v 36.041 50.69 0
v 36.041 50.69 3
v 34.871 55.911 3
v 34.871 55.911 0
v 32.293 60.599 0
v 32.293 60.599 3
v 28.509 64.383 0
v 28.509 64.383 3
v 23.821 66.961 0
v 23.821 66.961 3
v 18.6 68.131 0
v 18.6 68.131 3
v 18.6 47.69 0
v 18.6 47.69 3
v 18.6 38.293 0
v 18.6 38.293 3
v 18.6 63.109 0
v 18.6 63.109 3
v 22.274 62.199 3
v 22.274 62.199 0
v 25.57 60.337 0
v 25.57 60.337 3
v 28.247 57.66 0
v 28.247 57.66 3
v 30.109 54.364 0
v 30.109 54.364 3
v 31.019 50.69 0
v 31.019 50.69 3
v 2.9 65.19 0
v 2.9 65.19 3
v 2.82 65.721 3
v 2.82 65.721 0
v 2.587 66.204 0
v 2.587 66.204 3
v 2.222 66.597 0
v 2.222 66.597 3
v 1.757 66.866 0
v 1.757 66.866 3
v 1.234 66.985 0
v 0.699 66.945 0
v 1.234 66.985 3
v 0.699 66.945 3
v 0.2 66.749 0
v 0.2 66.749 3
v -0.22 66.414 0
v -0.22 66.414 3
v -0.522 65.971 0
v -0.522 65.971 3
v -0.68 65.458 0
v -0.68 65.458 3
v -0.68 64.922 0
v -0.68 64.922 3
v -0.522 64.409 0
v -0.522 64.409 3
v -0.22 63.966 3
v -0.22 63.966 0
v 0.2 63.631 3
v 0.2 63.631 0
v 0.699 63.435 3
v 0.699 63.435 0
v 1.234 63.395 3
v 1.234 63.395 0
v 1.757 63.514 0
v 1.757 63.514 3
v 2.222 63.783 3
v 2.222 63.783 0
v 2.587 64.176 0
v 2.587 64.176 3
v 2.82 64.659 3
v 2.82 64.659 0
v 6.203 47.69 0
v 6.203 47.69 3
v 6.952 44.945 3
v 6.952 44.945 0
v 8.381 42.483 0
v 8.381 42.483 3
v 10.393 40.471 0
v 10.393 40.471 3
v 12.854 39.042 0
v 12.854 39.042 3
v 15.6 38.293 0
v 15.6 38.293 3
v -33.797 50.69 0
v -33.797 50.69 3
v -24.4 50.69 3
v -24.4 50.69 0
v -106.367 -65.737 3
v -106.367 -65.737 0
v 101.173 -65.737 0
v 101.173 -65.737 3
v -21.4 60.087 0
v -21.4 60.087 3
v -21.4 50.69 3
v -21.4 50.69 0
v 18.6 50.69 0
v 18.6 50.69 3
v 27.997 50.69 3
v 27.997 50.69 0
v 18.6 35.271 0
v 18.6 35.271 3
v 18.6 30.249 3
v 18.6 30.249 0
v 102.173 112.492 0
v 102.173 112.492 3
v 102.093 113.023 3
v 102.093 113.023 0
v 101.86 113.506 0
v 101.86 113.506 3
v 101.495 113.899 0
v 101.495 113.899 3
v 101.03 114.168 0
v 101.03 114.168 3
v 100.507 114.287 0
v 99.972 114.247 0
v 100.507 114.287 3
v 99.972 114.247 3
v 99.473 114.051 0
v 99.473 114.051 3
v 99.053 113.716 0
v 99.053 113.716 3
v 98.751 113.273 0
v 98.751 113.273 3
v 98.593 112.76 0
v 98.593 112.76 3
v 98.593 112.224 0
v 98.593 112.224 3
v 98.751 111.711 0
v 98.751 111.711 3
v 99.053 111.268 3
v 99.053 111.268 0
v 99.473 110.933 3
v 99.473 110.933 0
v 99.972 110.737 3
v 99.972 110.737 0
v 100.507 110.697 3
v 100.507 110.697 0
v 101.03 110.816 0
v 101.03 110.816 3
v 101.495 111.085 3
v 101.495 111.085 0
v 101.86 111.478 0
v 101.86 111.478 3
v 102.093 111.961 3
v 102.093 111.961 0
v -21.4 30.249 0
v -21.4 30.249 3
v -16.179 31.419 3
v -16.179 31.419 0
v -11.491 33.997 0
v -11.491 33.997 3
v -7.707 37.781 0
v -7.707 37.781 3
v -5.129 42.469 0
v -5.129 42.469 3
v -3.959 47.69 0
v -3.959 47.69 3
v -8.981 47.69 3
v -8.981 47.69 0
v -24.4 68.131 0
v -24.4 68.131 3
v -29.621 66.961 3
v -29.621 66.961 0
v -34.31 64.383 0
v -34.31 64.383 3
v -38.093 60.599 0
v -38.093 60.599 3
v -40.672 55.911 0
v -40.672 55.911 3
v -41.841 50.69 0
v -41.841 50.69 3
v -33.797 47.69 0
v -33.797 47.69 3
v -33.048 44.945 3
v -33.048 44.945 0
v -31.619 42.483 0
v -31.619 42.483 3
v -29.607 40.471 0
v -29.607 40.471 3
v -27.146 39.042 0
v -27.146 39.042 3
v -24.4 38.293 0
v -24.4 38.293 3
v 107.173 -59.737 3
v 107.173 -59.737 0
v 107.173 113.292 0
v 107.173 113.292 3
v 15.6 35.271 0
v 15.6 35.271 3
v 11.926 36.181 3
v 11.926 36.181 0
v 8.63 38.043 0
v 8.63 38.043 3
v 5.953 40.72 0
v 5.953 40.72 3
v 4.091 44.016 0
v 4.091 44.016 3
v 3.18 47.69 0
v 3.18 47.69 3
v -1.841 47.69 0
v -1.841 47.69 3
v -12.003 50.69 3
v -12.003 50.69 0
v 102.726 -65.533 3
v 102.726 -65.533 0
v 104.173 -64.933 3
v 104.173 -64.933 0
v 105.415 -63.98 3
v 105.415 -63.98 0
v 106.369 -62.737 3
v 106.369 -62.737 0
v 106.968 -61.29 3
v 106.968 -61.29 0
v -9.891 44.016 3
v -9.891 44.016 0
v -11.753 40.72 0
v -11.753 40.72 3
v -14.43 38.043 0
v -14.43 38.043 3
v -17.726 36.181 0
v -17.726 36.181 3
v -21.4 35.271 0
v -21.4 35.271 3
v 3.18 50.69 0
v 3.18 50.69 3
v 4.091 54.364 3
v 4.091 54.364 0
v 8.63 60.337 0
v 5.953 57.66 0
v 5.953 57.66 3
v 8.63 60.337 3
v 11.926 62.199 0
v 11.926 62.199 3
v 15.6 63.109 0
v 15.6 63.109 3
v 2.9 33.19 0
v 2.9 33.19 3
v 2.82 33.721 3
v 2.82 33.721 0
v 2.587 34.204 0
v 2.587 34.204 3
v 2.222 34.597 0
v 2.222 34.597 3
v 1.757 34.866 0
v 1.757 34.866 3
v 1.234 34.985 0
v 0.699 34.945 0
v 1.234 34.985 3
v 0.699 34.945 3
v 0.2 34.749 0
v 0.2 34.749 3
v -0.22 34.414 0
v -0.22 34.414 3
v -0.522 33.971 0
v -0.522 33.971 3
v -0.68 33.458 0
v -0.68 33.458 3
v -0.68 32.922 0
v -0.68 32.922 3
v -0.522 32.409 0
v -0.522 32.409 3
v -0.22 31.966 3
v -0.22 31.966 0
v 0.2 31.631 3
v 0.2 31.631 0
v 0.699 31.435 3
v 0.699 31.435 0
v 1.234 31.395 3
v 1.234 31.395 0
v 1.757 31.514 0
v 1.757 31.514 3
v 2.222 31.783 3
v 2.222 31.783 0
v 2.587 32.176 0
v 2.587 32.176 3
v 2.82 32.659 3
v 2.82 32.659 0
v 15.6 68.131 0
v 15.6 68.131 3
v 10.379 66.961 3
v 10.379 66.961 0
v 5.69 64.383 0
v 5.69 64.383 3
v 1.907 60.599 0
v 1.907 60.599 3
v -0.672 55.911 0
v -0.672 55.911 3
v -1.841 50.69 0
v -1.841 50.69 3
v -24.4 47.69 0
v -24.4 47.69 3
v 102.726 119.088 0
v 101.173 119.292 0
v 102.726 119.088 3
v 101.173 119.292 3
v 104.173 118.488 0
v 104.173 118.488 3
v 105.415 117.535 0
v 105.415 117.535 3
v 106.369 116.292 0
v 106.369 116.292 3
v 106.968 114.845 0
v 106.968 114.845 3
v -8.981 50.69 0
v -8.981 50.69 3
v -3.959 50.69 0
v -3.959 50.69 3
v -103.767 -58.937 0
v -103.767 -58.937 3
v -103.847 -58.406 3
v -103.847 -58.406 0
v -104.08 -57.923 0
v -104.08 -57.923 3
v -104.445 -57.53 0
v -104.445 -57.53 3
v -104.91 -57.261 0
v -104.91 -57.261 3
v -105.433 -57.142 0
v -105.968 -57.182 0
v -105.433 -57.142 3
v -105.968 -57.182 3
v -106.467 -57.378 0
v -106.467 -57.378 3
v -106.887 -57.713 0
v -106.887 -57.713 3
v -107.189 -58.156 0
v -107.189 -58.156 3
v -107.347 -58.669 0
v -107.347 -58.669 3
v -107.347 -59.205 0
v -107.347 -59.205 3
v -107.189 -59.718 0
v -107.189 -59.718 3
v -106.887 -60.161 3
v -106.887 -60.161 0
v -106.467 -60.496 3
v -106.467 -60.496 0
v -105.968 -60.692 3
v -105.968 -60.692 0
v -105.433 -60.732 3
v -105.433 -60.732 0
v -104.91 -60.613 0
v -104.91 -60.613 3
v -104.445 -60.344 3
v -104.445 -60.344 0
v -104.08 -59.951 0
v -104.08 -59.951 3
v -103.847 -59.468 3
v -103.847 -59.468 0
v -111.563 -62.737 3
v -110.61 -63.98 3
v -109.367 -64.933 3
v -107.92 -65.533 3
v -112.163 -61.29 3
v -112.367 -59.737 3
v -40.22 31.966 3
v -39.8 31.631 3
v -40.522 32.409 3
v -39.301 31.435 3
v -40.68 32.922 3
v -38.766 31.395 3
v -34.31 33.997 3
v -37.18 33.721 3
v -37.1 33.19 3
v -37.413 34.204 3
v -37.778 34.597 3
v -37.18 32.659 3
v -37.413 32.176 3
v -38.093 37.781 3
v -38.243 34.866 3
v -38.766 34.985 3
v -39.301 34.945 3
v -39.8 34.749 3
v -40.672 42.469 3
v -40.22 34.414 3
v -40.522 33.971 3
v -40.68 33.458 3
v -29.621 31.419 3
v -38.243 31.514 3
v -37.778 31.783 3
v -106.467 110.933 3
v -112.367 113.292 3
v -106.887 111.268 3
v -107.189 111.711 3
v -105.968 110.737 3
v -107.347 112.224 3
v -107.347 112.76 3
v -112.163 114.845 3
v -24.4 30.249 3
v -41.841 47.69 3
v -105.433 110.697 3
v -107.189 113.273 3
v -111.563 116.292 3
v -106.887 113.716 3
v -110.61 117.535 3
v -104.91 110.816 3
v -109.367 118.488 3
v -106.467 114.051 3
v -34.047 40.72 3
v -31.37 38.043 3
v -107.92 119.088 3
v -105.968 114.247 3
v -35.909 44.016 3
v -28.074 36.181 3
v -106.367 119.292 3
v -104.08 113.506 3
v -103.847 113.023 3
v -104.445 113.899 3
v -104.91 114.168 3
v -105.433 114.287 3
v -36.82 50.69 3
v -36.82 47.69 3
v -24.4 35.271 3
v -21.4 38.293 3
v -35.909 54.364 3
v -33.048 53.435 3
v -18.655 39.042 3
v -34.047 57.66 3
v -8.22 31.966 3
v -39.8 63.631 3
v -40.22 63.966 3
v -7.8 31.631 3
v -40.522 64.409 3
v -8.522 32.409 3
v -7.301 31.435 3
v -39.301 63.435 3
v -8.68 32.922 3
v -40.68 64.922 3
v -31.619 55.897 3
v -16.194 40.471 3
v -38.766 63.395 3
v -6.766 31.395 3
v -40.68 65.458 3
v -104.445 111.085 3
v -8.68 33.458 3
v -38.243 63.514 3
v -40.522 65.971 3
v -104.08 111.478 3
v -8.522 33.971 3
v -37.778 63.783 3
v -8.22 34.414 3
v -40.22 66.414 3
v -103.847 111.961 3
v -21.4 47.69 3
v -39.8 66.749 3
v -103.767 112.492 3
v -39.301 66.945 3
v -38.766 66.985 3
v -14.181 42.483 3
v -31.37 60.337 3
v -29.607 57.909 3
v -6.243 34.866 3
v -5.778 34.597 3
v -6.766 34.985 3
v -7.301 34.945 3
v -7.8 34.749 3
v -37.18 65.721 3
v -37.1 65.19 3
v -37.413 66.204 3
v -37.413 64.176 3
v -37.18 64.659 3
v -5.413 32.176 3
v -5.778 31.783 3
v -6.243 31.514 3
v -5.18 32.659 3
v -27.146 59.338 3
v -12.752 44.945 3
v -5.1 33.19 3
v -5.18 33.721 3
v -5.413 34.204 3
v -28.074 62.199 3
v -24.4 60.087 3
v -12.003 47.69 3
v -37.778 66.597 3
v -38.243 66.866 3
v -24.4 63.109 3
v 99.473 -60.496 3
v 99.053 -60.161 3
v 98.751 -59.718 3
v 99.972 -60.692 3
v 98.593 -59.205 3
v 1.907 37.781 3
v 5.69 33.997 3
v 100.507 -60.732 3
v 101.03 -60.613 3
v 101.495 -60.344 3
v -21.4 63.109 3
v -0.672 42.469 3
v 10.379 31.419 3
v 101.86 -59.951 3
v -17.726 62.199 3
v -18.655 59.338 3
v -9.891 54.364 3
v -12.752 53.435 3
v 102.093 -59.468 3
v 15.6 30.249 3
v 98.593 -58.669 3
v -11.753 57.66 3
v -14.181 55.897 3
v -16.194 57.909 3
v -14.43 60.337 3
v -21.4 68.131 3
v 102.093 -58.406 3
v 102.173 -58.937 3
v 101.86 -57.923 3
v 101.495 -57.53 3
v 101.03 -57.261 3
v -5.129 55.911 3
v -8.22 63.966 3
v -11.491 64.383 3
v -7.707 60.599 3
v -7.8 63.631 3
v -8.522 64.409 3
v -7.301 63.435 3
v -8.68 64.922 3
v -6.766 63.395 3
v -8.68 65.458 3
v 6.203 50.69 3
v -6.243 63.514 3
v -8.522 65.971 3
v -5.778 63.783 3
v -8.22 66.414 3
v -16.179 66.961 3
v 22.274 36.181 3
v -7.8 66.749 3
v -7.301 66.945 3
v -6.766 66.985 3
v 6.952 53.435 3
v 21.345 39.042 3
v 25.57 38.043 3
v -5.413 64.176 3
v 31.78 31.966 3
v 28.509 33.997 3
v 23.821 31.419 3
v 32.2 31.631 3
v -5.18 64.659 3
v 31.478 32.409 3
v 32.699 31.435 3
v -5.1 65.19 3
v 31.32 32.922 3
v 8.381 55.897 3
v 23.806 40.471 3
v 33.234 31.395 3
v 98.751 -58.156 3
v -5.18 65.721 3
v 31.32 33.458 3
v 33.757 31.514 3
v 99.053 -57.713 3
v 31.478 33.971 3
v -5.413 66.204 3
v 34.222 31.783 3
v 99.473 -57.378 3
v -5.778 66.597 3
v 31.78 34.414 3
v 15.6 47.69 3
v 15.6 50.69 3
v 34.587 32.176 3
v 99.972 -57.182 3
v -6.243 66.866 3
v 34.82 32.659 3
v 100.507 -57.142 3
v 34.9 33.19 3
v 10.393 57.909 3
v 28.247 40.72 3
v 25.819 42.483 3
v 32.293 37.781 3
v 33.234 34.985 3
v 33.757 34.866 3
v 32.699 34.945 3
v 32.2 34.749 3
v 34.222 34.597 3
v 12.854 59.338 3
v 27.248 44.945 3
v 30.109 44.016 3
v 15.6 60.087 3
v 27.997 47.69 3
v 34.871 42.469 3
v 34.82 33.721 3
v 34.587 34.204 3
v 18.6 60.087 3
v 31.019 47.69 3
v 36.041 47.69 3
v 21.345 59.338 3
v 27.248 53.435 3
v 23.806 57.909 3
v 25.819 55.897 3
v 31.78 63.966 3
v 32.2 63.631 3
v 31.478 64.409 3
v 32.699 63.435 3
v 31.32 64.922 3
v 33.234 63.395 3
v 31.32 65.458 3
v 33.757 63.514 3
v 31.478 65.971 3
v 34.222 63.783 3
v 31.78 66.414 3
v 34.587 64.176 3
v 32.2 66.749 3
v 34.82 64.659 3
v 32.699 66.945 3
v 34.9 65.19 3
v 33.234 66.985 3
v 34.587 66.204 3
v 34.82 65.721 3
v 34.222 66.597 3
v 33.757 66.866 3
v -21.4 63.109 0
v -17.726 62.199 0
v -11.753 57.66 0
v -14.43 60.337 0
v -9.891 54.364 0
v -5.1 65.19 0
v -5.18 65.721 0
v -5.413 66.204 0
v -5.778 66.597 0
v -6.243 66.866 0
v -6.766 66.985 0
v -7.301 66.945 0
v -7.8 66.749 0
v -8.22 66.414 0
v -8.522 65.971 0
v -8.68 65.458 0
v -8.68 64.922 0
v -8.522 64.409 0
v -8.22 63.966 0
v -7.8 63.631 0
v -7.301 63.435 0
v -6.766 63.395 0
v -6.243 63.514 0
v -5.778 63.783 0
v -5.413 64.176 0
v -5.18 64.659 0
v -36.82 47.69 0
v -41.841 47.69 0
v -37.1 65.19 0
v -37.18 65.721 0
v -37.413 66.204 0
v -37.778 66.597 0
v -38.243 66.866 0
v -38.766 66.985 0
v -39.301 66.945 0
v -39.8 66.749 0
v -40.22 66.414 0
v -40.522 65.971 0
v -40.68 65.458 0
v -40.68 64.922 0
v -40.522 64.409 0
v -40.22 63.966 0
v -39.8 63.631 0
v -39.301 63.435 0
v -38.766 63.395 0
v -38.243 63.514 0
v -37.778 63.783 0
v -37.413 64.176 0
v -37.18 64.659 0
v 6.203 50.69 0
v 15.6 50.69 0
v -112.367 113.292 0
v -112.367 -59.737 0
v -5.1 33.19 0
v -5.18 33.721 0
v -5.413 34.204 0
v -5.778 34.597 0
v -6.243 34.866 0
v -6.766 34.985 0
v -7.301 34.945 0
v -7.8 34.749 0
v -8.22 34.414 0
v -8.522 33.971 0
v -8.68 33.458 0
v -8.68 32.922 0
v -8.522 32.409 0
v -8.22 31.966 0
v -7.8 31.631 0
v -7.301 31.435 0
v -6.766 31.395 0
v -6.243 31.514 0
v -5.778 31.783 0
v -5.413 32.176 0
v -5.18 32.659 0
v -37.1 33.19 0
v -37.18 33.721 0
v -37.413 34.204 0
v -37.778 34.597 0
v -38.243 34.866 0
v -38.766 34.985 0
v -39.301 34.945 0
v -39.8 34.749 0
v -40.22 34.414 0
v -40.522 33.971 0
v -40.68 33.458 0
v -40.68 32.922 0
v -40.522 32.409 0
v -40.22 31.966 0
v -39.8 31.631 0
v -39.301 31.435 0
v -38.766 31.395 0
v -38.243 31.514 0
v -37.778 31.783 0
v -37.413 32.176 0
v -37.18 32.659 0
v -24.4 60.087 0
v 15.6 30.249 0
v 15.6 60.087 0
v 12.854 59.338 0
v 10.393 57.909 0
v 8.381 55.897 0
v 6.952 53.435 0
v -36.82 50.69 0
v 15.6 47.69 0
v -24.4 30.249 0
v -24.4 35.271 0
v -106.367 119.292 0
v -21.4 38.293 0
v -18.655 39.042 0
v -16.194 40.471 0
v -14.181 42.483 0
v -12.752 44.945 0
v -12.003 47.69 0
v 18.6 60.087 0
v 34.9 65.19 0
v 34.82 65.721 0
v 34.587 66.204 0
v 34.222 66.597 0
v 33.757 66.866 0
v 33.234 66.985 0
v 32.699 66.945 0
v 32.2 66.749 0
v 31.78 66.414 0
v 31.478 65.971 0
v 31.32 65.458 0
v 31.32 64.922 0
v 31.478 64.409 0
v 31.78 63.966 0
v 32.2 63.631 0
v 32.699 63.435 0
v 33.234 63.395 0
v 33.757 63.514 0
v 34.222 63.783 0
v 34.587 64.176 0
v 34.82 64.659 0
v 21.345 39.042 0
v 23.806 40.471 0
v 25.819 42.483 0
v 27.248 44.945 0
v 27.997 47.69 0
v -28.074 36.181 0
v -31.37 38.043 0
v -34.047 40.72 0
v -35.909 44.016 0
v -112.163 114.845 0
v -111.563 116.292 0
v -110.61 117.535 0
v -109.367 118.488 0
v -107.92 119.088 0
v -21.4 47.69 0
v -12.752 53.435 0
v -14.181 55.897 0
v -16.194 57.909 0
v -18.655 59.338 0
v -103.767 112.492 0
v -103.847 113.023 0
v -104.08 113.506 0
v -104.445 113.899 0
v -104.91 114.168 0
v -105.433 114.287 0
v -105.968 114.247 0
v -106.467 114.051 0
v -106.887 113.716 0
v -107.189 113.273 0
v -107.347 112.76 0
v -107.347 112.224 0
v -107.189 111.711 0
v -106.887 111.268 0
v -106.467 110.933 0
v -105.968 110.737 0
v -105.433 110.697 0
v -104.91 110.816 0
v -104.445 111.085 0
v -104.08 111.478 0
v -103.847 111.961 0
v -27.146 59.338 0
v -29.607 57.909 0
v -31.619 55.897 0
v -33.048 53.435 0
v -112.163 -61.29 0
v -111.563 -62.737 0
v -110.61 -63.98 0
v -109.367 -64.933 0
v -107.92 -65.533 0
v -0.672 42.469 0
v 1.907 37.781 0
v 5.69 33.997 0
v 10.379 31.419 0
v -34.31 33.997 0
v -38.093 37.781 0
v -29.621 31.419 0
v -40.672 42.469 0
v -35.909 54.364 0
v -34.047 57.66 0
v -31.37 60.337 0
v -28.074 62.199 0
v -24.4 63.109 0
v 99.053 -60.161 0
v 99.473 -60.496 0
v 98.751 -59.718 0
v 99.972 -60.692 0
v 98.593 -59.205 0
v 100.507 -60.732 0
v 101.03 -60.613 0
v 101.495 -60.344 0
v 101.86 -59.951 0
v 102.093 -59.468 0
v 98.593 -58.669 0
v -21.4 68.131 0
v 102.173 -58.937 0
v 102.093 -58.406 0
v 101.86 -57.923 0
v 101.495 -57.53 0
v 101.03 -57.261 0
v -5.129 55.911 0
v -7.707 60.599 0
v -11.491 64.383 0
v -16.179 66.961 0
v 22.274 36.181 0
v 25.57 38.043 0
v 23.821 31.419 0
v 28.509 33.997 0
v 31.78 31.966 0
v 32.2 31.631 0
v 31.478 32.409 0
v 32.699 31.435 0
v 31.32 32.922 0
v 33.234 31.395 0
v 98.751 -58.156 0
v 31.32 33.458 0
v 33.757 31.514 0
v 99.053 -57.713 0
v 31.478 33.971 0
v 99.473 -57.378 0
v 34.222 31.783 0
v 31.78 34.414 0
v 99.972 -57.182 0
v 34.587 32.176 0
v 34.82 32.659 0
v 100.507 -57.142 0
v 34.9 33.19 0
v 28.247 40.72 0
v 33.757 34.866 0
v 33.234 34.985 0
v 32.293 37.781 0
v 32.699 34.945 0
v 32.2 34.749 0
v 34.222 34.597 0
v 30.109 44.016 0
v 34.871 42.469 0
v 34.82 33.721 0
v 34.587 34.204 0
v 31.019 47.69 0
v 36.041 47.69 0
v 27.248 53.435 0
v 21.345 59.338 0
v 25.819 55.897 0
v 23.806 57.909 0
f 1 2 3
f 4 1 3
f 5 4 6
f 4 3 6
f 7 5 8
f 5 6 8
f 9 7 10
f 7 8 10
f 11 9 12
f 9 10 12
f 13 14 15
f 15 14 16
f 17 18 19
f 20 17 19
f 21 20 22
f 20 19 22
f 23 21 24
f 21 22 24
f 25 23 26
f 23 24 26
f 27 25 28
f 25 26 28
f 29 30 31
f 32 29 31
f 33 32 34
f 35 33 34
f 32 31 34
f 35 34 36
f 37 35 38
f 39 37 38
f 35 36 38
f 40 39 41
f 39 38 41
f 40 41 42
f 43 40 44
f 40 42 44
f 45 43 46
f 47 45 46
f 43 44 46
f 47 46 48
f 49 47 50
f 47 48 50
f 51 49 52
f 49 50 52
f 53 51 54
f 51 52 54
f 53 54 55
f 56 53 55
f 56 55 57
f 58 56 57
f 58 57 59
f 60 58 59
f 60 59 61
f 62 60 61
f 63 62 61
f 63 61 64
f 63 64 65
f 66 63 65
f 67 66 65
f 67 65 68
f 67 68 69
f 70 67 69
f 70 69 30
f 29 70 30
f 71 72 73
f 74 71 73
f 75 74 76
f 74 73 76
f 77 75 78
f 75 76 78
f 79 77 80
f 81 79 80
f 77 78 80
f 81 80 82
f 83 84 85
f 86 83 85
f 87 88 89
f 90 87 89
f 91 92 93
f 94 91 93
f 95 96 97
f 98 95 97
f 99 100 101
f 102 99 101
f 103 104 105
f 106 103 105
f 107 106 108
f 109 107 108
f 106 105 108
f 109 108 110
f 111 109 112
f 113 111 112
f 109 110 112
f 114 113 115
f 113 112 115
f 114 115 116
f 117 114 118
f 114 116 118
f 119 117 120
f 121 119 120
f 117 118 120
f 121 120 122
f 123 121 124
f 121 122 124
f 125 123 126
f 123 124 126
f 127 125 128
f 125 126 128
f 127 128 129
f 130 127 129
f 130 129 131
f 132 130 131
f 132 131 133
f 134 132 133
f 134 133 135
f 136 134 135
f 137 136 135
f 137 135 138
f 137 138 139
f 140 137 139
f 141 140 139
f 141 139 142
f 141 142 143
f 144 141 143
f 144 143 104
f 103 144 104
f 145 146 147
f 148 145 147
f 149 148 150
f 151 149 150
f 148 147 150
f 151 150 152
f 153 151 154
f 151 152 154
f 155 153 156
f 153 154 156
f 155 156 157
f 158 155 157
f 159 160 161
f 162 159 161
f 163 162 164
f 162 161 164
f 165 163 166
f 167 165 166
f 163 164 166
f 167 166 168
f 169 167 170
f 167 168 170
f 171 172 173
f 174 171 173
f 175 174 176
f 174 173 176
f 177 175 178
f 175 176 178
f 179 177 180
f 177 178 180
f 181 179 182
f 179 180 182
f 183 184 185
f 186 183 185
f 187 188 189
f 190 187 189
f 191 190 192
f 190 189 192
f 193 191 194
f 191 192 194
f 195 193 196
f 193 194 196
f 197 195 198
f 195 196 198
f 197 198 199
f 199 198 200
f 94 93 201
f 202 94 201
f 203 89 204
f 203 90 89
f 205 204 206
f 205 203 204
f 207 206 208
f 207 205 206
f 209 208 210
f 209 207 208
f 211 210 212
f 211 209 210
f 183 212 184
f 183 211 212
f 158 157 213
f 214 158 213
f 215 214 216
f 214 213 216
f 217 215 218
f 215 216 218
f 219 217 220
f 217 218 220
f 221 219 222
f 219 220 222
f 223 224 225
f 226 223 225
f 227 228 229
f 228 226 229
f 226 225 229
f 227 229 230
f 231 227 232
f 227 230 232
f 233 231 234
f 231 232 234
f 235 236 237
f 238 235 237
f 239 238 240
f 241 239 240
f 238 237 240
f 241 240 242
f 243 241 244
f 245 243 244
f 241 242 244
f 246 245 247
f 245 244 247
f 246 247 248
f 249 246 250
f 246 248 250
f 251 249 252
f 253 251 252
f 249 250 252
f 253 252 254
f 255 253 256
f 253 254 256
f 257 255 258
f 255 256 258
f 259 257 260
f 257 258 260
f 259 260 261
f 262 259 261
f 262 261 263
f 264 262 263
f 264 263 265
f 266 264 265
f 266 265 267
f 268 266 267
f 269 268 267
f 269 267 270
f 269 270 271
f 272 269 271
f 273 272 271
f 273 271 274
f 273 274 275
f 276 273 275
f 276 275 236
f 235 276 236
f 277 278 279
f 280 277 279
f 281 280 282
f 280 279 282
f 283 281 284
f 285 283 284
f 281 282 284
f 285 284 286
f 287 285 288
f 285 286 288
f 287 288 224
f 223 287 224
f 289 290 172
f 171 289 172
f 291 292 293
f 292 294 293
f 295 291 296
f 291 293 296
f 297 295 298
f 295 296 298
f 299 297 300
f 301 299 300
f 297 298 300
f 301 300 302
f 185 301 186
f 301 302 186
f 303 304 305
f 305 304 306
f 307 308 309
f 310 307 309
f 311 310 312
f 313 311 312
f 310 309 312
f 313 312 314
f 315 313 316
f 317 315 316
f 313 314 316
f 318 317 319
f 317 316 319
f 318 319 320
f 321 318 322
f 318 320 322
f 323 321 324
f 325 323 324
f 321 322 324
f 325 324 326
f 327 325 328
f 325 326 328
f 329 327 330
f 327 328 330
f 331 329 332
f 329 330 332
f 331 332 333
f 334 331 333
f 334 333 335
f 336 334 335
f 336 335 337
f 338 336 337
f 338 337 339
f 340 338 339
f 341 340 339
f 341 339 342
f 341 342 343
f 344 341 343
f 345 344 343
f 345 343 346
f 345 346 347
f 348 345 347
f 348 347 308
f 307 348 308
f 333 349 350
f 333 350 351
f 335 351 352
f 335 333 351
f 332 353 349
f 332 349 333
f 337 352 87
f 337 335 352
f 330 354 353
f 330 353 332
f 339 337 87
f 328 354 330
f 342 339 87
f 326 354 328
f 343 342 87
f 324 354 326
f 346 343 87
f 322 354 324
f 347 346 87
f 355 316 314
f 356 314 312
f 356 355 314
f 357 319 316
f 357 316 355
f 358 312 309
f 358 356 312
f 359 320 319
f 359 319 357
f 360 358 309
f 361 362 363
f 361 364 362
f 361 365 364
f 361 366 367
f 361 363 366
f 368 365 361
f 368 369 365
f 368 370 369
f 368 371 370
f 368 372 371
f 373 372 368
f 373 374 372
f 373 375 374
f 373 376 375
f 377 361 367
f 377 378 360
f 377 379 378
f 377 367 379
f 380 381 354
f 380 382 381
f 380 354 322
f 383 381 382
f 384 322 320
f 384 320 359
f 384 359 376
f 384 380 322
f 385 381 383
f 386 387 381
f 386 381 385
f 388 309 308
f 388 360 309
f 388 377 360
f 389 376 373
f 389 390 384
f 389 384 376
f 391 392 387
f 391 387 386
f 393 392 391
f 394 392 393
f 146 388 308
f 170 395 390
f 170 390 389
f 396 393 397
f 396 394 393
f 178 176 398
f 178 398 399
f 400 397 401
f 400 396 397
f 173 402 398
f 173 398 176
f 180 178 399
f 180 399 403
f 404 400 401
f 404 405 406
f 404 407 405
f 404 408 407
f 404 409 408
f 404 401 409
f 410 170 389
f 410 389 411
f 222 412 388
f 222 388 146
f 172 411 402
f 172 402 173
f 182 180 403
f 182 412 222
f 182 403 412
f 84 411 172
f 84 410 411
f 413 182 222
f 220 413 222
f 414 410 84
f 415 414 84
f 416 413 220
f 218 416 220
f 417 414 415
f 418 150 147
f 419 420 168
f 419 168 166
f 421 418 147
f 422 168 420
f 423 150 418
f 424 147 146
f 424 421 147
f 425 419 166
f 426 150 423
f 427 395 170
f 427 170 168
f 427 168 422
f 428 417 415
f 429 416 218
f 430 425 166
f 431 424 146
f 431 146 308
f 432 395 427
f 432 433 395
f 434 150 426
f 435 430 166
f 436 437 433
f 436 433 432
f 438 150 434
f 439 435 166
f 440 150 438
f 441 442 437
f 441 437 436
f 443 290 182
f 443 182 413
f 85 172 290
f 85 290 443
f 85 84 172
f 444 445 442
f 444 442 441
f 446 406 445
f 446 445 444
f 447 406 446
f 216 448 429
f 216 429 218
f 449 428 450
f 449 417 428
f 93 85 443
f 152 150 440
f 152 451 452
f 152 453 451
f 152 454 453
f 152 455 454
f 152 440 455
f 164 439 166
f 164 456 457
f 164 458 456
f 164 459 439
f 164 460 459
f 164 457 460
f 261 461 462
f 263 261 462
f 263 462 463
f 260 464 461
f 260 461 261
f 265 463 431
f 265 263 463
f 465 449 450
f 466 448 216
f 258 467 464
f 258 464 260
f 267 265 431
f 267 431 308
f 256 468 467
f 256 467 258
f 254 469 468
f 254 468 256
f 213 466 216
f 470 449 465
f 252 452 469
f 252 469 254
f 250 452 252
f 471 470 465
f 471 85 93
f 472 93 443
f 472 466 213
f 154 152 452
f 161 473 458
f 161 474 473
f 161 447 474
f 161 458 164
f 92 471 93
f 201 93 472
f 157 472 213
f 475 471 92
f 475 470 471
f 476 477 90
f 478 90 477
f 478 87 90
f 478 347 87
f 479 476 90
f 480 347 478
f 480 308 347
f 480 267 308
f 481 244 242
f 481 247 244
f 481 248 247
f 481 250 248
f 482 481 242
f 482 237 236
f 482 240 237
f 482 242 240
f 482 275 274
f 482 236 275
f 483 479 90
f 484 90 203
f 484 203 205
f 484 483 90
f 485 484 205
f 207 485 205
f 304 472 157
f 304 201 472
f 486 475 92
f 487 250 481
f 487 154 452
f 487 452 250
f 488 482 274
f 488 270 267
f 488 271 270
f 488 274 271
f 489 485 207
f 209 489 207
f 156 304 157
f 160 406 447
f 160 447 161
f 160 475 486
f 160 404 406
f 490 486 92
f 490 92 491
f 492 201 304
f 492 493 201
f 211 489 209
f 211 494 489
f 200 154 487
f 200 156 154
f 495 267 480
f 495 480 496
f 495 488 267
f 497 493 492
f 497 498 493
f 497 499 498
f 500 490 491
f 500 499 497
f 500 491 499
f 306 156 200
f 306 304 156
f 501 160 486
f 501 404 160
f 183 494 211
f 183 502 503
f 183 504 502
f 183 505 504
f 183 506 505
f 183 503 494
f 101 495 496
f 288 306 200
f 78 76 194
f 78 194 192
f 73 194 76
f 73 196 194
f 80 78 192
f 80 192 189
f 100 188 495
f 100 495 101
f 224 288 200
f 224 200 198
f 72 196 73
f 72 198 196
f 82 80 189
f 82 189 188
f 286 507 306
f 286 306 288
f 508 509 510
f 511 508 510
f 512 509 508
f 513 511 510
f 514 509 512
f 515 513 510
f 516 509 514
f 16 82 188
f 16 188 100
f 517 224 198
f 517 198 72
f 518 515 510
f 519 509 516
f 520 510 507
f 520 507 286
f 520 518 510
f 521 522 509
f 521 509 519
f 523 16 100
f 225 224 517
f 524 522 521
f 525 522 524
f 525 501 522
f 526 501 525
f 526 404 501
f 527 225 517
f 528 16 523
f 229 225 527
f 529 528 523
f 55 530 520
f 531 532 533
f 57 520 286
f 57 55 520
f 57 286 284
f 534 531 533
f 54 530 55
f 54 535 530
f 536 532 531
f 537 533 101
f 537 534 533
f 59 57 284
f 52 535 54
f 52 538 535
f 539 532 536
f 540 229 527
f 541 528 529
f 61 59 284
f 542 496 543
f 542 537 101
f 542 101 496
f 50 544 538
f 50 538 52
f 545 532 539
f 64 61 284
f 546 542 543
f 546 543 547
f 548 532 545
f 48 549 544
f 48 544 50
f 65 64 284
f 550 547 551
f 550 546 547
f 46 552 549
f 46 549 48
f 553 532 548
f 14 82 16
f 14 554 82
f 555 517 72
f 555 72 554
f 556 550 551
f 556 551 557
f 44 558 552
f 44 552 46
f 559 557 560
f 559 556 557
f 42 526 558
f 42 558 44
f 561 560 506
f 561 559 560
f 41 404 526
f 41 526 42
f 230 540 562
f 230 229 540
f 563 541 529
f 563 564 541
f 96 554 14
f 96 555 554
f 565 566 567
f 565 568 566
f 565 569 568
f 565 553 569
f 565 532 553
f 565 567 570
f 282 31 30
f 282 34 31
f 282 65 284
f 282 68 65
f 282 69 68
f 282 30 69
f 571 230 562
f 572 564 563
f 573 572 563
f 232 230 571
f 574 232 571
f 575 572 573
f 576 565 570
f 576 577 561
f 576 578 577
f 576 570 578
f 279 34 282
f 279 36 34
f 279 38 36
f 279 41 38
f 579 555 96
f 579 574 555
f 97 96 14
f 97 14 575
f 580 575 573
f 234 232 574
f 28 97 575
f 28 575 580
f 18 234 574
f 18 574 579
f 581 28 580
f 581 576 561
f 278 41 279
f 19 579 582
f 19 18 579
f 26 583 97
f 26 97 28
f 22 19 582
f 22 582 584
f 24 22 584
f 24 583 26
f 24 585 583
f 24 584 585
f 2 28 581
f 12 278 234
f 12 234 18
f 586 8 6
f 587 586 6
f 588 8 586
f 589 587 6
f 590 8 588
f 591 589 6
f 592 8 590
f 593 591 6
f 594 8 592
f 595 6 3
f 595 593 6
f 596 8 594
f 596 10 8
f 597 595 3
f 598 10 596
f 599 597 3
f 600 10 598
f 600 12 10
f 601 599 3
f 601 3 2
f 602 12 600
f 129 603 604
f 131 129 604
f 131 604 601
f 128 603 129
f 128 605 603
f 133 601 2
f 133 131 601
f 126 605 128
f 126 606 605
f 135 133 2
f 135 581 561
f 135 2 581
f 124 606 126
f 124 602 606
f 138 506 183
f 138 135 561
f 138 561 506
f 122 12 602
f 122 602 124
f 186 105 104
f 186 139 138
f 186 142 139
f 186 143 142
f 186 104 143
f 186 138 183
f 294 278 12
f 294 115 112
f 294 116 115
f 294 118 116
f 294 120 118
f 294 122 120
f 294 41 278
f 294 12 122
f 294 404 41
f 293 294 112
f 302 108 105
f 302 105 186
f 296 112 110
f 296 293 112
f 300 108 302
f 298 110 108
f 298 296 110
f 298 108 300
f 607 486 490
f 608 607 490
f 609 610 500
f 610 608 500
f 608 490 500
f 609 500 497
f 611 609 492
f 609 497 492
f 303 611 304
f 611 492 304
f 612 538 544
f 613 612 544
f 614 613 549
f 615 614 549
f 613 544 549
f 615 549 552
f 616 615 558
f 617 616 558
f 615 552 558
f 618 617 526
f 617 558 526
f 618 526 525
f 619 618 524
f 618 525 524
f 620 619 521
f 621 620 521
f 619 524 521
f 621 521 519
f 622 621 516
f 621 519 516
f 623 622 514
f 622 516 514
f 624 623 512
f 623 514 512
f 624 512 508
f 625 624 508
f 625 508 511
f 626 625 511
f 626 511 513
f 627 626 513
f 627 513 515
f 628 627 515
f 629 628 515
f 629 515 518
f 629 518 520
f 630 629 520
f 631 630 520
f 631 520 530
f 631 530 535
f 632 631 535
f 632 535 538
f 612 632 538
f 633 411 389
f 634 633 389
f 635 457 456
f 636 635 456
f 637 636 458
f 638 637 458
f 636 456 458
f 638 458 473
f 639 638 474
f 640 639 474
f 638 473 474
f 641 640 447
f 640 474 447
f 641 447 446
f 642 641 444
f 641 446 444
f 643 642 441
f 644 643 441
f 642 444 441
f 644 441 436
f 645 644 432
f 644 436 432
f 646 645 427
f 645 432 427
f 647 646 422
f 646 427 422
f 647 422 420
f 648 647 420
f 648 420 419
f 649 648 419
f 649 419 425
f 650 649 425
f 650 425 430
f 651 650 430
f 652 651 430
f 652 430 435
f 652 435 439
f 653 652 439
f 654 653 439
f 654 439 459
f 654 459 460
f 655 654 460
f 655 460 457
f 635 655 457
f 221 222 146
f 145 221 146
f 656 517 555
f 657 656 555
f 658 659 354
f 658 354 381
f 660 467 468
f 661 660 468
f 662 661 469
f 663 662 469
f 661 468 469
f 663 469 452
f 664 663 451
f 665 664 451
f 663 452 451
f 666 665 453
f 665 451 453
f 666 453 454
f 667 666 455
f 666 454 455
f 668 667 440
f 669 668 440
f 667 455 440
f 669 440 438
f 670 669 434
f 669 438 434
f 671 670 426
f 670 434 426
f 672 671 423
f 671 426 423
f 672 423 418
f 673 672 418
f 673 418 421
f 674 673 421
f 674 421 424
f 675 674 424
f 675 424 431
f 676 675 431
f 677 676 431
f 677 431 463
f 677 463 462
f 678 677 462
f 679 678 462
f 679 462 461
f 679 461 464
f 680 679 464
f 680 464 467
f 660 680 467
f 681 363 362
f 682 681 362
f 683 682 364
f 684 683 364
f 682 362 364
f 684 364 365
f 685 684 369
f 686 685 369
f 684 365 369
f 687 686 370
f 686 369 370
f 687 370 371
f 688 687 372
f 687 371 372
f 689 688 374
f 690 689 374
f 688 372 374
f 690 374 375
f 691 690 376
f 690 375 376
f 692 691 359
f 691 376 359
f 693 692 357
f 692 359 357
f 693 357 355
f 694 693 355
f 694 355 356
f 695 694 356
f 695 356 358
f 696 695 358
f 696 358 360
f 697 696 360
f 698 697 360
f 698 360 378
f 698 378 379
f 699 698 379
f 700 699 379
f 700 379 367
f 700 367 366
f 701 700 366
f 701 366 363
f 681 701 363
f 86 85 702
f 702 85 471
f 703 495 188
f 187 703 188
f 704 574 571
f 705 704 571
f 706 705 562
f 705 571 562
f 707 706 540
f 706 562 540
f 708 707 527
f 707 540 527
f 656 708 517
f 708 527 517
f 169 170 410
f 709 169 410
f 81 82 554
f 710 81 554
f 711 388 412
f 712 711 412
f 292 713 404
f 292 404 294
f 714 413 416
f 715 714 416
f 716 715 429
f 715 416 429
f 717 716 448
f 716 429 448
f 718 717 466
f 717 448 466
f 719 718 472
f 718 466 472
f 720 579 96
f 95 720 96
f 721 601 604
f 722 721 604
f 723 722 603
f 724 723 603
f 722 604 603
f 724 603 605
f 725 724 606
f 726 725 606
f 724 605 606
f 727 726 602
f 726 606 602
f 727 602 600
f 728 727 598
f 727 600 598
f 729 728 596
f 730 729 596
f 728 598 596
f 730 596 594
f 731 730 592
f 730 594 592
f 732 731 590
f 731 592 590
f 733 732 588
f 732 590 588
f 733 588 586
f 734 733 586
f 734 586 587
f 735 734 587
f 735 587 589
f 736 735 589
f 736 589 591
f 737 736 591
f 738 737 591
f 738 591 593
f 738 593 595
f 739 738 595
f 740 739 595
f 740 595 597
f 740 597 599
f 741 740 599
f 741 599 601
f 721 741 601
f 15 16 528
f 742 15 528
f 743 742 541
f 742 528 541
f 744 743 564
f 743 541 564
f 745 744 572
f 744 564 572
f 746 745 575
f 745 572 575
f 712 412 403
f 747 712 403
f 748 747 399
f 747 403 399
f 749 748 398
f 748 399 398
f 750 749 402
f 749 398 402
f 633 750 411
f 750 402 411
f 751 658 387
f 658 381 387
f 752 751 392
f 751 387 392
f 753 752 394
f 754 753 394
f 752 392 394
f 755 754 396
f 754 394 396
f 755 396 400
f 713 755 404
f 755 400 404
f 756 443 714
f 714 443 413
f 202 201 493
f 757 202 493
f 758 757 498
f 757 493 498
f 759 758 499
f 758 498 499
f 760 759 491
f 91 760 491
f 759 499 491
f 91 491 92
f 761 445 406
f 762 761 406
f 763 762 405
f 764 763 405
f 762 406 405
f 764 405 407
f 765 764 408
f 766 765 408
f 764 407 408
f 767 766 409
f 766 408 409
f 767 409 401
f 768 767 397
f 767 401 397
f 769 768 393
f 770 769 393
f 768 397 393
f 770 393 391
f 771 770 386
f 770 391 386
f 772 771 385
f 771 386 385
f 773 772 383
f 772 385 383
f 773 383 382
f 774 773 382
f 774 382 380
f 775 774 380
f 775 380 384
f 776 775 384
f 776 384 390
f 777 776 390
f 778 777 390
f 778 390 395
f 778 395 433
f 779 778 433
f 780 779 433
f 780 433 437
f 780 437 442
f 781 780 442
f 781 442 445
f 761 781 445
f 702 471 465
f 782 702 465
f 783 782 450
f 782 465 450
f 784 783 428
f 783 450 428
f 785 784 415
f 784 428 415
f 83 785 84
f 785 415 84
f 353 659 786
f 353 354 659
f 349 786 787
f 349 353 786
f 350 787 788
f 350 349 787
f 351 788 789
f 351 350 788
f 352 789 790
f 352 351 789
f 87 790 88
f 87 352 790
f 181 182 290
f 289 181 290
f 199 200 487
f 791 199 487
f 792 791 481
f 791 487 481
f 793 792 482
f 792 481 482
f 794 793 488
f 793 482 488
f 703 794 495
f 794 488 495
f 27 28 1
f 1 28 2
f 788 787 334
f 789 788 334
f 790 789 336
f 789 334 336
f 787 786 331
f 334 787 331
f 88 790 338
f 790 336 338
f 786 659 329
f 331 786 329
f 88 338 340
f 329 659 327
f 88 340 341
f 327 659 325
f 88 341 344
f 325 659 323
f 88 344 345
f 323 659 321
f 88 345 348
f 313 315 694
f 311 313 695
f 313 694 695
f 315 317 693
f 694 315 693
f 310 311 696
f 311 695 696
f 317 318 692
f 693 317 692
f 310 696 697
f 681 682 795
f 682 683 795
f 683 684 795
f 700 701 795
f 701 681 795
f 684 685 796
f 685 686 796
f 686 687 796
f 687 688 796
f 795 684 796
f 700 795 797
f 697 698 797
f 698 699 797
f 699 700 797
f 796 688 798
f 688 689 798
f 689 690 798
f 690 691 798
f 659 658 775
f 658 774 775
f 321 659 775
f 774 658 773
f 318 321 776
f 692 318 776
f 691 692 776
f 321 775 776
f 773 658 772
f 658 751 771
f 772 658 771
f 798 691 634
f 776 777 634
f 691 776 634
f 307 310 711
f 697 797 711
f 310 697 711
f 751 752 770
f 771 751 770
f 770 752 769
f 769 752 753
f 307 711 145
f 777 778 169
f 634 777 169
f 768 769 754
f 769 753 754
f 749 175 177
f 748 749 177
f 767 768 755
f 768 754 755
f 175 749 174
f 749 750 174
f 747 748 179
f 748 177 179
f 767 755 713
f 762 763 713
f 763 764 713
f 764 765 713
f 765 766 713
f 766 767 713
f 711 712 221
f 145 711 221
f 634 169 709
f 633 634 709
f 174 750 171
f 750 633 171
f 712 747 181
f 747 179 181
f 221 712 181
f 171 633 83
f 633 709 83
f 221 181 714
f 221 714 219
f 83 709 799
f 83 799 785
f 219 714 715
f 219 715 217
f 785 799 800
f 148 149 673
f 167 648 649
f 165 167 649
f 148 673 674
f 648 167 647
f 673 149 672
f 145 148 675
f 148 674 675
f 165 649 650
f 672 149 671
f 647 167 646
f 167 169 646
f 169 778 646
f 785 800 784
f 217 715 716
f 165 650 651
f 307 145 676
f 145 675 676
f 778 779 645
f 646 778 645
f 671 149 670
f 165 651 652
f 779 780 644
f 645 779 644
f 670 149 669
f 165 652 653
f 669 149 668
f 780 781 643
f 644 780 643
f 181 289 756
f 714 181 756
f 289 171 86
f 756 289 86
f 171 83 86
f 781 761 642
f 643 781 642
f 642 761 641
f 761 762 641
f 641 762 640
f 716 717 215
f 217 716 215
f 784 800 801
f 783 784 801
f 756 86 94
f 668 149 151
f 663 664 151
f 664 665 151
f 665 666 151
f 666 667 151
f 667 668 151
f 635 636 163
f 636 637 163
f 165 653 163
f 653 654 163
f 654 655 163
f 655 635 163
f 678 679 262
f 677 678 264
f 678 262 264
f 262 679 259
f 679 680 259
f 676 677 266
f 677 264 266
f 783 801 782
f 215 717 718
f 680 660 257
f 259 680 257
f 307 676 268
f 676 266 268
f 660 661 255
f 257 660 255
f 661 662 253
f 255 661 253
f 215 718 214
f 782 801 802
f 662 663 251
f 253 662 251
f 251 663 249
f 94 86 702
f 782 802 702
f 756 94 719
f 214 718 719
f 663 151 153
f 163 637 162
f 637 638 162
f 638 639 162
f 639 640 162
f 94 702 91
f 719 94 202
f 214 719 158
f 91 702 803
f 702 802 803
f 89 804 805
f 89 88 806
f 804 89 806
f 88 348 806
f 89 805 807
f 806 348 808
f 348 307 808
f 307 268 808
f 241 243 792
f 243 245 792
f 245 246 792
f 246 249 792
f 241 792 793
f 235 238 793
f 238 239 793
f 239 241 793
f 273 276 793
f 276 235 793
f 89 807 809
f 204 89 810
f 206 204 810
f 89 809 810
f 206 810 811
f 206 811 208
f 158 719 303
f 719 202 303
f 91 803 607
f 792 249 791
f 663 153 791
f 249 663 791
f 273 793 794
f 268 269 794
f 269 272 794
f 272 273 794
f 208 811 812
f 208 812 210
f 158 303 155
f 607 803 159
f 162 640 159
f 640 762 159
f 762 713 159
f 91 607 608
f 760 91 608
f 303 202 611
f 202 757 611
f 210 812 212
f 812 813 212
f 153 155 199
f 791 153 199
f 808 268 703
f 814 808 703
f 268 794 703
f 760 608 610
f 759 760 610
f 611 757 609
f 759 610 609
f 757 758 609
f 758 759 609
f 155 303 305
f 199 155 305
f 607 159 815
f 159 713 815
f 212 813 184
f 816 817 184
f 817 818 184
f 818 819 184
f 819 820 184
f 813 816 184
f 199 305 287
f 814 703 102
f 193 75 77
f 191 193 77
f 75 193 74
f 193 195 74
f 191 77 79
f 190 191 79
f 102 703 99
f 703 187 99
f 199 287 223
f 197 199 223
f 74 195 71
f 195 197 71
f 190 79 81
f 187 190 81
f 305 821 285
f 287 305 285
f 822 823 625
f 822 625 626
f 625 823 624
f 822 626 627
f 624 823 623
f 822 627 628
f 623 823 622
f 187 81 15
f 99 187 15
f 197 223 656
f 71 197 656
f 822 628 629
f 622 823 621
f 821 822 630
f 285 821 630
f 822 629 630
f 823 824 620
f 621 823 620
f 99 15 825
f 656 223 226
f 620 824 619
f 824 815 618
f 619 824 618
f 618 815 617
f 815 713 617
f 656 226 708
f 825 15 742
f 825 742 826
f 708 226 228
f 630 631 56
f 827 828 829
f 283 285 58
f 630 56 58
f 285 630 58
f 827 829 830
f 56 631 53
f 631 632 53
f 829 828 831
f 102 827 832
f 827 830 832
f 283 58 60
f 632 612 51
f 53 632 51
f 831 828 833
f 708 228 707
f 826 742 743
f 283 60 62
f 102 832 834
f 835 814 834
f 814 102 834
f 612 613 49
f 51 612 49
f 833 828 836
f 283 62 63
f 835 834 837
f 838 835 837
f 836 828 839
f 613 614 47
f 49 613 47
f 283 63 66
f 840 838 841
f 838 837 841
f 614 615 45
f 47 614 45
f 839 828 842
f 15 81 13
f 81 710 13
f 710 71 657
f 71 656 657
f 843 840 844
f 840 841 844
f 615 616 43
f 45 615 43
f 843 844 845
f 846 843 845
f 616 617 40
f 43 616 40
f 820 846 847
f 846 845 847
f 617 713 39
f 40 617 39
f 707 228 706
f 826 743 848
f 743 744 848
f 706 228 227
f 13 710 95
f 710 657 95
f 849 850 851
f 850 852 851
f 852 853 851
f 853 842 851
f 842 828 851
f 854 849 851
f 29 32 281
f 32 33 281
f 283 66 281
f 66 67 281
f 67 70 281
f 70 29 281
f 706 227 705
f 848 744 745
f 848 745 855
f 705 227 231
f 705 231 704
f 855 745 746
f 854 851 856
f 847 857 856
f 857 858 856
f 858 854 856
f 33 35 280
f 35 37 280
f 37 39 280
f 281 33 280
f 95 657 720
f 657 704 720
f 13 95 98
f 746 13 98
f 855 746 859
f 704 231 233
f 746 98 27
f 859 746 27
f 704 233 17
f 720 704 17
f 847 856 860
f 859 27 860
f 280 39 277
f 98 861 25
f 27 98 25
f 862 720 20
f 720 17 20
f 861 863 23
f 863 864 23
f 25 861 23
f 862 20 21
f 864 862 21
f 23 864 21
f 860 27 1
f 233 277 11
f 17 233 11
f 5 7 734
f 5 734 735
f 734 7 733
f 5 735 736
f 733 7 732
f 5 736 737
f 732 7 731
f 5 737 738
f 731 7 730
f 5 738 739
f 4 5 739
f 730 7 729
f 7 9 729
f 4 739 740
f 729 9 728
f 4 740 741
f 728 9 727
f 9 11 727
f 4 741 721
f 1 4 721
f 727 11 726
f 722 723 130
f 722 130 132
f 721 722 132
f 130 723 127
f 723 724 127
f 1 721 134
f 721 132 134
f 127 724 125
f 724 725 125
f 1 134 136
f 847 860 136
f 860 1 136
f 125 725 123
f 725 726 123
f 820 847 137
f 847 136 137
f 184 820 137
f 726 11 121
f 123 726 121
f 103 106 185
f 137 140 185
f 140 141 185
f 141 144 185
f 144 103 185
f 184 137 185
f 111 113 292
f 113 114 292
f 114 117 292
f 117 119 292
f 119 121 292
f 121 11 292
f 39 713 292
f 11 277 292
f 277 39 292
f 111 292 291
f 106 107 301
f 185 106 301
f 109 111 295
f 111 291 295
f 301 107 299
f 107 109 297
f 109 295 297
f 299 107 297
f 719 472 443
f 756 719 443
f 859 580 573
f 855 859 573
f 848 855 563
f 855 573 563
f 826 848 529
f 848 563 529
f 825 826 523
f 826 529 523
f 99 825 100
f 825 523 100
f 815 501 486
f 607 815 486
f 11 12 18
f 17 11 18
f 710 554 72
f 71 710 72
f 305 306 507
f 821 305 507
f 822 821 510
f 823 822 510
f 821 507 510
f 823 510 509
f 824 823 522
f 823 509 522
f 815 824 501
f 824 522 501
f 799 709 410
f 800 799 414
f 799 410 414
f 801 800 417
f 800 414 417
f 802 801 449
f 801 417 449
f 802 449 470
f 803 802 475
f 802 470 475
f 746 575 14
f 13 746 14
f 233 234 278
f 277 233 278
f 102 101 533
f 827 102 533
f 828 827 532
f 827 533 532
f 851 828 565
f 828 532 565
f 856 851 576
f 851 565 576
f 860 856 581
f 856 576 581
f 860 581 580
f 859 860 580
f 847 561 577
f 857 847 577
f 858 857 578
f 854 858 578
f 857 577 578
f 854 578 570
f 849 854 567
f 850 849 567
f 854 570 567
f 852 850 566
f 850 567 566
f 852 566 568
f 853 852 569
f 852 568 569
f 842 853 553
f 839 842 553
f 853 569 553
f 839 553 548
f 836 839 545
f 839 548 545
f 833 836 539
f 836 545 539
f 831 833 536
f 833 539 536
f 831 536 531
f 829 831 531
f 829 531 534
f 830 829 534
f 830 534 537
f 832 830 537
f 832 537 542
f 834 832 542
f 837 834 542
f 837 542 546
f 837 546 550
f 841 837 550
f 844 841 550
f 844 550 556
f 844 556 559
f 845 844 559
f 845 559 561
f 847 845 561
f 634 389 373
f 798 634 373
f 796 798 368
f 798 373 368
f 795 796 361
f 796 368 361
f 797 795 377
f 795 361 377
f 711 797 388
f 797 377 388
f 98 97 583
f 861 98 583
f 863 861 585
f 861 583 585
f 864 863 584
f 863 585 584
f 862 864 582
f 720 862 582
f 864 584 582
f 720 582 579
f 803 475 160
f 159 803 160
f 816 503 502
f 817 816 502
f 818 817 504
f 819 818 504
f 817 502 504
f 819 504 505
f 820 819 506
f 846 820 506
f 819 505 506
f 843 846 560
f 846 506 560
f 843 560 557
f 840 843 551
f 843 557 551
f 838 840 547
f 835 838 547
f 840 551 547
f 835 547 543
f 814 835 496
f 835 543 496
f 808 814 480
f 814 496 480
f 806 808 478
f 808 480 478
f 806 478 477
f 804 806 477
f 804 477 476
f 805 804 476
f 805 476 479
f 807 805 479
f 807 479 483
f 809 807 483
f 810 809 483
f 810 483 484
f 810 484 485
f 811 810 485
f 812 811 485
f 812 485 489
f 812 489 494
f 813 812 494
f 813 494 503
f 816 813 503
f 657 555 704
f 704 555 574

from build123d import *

# Parameters (mm, degrees)
F0_W     = 219.54
F0_H     = 185.029
F1_DEPTH = 3
F2_R     = 1.8
F3_DEPTH = 25
F4_R     = 6


with BuildPart() as f1:
    # F0 (on Top) → F1 (new body)
    with BuildSketch(Plane.XY):
        with Locations((-2.597172, 26.777473)):
            Rectangle(F0_W, F0_H)
    extrude(amount=F1_DEPTH)

    # F2 (on face) → F3 (cut)
    with BuildSketch(Plane.XY.offset(3)):
        with BuildLine():
            Line((-24.400172, 63.109384), (-24.400172, 68.13067))
            ThreePointArc((-24.400172, 68.13067), (-36.335201, 62.625002), (-41.840869, 50.689973))
            Line((-41.840869, 50.689973), (-36.819583, 50.689973))
            ThreePointArc((-36.819583, 50.689973), (-32.799667, 59.089468), (-24.400172, 63.109384))
        make_face()
        with BuildLine():
            ThreePointArc((-41.840869, 47.689973), (-36.335201, 35.754944), (-24.400172, 30.249276))
            Line((-24.400172, 30.249276), (-24.400172, 35.270562))
            ThreePointArc((-24.400172, 35.270562), (-32.799667, 39.290478), (-36.819583, 47.689973))
            Line((-36.819583, 47.689973), (-41.840869, 47.689973))
        make_face()
        with BuildLine():
            ThreePointArc((-21.400172, 30.249276), (-9.465143, 35.754944), (-3.959475, 47.689973))
            Line((-3.959475, 47.689973), (-8.980761, 47.689973))
            ThreePointArc((-8.980761, 47.689973), (-13.000677, 39.290478), (-21.400172, 35.270562))
            Line((-21.400172, 35.270562), (-21.400172, 30.249276))
        make_face()
        with BuildLine():
            Line((-12.002924, 47.689973), (-21.400172, 47.689973))
            Line((-21.400172, 47.689973), (-21.400172, 38.292726))
            ThreePointArc((-21.400172, 38.292726), (-15.121997, 41.411798), (-12.002924, 47.689973))
        make_face()
        with BuildLine():
            Line((-24.400172, 47.689973), (-33.797419, 47.689973))
            ThreePointArc((-33.797419, 47.689973), (-30.678346, 41.411798), (-24.400172, 38.292726))
            Line((-24.400172, 38.292726), (-24.400172, 47.689973))
        make_face()
        with BuildLine():
            Line((-33.797419, 50.689973), (-24.400172, 50.689973))
            Line((-24.400172, 50.689973), (-24.400172, 60.08722))
            ThreePointArc((-24.400172, 60.08722), (-30.678346, 56.968148), (-33.797419, 50.689973))
        make_face()
        with BuildLine():
            Line((-8.980761, 50.689973), (-3.959475, 50.689973))
            ThreePointArc((-3.959475, 50.689973), (-9.465143, 62.625002), (-21.400172, 68.13067))
            Line((-21.400172, 68.13067), (-21.400172, 63.109384))
            ThreePointArc((-21.400172, 63.109384), (-13.000677, 59.089468), (-8.980761, 50.689973))
        make_face()
        with BuildLine():
            Line((15.599828, 63.109384), (15.599828, 68.13067))
            ThreePointArc((15.599828, 68.13067), (3.664799, 62.625002), (-1.840869, 50.689973))
            Line((-1.840869, 50.689973), (3.180417, 50.689973))
            ThreePointArc((3.180417, 50.689973), (7.200333, 59.089468), (15.599828, 63.109384))
        make_face()
        with BuildLine():
            Line((31.019239, 50.689973), (36.040525, 50.689973))
            ThreePointArc((36.040525, 50.689973), (30.534857, 62.625002), (18.599828, 68.13067))
            Line((18.599828, 68.13067), (18.599828, 63.109384))
            ThreePointArc((18.599828, 63.109384), (26.999323, 59.089468), (31.019239, 50.689973))
        make_face()
        with BuildLine():
            Line((18.599828, 50.689973), (27.997076, 50.689973))
            ThreePointArc((27.997076, 50.689973), (24.878003, 56.968148), (18.599828, 60.08722))
            Line((18.599828, 60.08722), (18.599828, 50.689973))
        make_face()
        with BuildLine():
            Line((6.202581, 50.689973), (15.599828, 50.689973))
            Line((15.599828, 50.689973), (15.599828, 60.08722))
            ThreePointArc((15.599828, 60.08722), (9.321654, 56.968148), (6.202581, 50.689973))
        make_face()
        with BuildLine():
            Line((15.599828, 47.689973), (6.202581, 47.689973))
            ThreePointArc((6.202581, 47.689973), (9.321654, 41.411798), (15.599828, 38.292726))
            Line((15.599828, 38.292726), (15.599828, 47.689973))
        make_face()
        with BuildLine():
            Line((27.997076, 47.689973), (18.599828, 47.689973))
            Line((18.599828, 47.689973), (18.599828, 38.292726))
            ThreePointArc((18.599828, 38.292726), (24.878003, 41.411798), (27.997076, 47.689973))
        make_face()
        with BuildLine():
            ThreePointArc((-1.840869, 47.689973), (3.664799, 35.754944), (15.599828, 30.249276))
            Line((15.599828, 30.249276), (15.599828, 35.270562))
            ThreePointArc((15.599828, 35.270562), (7.200333, 39.290478), (3.180417, 47.689973))
            Line((3.180417, 47.689973), (-1.840869, 47.689973))
        make_face()
        with BuildLine():
            ThreePointArc((18.599828, 30.249276), (30.534857, 35.754944), (36.040525, 47.689973))
            Line((36.040525, 47.689973), (31.019239, 47.689973))
            ThreePointArc((31.019239, 47.689973), (26.999323, 39.290478), (18.599828, 35.270562))
            Line((18.599828, 35.270562), (18.599828, 30.249276))
        make_face()
        with BuildLine():
            Line((-21.400172, 60.08722), (-21.400172, 50.689973))
            Line((-21.400172, 50.689973), (-12.002924, 50.689973))
            ThreePointArc((-12.002924, 50.689973), (-15.121997, 56.968148), (-21.400172, 60.08722))
        make_face()
        with Locations((-38.900172, 65.189973)):
            Circle(F2_R)
        with Locations((-6.900172, 65.189973)):
            Circle(F2_R)
        with Locations((1.099828, 65.189973)):
            Circle(F2_R)
        with Locations((33.099828, 65.189973)):
            Circle(F2_R)
        with Locations((33.099828, 33.189973)):
            Circle(F2_R)
        with Locations((1.099828, 33.189973)):
            Circle(F2_R)
        with Locations((-6.900172, 33.189973)):
            Circle(F2_R)
        with Locations((-38.900172, 33.189973)):
            Circle(F2_R)
        with Locations((-105.567172, -58.937027)):
            Circle(F2_R)
        with Locations((100.372828, -58.937027)):
            Circle(F2_R)
        with Locations((100.372828, 112.491973)):
            Circle(F2_R)
        with Locations((-105.567172, 112.491973)):
            Circle(F2_R)
    extrude(amount=-F3_DEPTH, mode=Mode.SUBTRACT)

    # F4
    f4_edges = [f1.edges().sort_by_distance(p)[0] for p in [
        (-112.367172, 119.291973, 1.5),
        (-112.367172, -65.737027, 1.5),
        (107.172828, -65.737027, 1.5),
        (107.172828, 119.291973, 1.5),
    ]]
    fillet(f4_edges, radius=F4_R)


solid = f1.part
